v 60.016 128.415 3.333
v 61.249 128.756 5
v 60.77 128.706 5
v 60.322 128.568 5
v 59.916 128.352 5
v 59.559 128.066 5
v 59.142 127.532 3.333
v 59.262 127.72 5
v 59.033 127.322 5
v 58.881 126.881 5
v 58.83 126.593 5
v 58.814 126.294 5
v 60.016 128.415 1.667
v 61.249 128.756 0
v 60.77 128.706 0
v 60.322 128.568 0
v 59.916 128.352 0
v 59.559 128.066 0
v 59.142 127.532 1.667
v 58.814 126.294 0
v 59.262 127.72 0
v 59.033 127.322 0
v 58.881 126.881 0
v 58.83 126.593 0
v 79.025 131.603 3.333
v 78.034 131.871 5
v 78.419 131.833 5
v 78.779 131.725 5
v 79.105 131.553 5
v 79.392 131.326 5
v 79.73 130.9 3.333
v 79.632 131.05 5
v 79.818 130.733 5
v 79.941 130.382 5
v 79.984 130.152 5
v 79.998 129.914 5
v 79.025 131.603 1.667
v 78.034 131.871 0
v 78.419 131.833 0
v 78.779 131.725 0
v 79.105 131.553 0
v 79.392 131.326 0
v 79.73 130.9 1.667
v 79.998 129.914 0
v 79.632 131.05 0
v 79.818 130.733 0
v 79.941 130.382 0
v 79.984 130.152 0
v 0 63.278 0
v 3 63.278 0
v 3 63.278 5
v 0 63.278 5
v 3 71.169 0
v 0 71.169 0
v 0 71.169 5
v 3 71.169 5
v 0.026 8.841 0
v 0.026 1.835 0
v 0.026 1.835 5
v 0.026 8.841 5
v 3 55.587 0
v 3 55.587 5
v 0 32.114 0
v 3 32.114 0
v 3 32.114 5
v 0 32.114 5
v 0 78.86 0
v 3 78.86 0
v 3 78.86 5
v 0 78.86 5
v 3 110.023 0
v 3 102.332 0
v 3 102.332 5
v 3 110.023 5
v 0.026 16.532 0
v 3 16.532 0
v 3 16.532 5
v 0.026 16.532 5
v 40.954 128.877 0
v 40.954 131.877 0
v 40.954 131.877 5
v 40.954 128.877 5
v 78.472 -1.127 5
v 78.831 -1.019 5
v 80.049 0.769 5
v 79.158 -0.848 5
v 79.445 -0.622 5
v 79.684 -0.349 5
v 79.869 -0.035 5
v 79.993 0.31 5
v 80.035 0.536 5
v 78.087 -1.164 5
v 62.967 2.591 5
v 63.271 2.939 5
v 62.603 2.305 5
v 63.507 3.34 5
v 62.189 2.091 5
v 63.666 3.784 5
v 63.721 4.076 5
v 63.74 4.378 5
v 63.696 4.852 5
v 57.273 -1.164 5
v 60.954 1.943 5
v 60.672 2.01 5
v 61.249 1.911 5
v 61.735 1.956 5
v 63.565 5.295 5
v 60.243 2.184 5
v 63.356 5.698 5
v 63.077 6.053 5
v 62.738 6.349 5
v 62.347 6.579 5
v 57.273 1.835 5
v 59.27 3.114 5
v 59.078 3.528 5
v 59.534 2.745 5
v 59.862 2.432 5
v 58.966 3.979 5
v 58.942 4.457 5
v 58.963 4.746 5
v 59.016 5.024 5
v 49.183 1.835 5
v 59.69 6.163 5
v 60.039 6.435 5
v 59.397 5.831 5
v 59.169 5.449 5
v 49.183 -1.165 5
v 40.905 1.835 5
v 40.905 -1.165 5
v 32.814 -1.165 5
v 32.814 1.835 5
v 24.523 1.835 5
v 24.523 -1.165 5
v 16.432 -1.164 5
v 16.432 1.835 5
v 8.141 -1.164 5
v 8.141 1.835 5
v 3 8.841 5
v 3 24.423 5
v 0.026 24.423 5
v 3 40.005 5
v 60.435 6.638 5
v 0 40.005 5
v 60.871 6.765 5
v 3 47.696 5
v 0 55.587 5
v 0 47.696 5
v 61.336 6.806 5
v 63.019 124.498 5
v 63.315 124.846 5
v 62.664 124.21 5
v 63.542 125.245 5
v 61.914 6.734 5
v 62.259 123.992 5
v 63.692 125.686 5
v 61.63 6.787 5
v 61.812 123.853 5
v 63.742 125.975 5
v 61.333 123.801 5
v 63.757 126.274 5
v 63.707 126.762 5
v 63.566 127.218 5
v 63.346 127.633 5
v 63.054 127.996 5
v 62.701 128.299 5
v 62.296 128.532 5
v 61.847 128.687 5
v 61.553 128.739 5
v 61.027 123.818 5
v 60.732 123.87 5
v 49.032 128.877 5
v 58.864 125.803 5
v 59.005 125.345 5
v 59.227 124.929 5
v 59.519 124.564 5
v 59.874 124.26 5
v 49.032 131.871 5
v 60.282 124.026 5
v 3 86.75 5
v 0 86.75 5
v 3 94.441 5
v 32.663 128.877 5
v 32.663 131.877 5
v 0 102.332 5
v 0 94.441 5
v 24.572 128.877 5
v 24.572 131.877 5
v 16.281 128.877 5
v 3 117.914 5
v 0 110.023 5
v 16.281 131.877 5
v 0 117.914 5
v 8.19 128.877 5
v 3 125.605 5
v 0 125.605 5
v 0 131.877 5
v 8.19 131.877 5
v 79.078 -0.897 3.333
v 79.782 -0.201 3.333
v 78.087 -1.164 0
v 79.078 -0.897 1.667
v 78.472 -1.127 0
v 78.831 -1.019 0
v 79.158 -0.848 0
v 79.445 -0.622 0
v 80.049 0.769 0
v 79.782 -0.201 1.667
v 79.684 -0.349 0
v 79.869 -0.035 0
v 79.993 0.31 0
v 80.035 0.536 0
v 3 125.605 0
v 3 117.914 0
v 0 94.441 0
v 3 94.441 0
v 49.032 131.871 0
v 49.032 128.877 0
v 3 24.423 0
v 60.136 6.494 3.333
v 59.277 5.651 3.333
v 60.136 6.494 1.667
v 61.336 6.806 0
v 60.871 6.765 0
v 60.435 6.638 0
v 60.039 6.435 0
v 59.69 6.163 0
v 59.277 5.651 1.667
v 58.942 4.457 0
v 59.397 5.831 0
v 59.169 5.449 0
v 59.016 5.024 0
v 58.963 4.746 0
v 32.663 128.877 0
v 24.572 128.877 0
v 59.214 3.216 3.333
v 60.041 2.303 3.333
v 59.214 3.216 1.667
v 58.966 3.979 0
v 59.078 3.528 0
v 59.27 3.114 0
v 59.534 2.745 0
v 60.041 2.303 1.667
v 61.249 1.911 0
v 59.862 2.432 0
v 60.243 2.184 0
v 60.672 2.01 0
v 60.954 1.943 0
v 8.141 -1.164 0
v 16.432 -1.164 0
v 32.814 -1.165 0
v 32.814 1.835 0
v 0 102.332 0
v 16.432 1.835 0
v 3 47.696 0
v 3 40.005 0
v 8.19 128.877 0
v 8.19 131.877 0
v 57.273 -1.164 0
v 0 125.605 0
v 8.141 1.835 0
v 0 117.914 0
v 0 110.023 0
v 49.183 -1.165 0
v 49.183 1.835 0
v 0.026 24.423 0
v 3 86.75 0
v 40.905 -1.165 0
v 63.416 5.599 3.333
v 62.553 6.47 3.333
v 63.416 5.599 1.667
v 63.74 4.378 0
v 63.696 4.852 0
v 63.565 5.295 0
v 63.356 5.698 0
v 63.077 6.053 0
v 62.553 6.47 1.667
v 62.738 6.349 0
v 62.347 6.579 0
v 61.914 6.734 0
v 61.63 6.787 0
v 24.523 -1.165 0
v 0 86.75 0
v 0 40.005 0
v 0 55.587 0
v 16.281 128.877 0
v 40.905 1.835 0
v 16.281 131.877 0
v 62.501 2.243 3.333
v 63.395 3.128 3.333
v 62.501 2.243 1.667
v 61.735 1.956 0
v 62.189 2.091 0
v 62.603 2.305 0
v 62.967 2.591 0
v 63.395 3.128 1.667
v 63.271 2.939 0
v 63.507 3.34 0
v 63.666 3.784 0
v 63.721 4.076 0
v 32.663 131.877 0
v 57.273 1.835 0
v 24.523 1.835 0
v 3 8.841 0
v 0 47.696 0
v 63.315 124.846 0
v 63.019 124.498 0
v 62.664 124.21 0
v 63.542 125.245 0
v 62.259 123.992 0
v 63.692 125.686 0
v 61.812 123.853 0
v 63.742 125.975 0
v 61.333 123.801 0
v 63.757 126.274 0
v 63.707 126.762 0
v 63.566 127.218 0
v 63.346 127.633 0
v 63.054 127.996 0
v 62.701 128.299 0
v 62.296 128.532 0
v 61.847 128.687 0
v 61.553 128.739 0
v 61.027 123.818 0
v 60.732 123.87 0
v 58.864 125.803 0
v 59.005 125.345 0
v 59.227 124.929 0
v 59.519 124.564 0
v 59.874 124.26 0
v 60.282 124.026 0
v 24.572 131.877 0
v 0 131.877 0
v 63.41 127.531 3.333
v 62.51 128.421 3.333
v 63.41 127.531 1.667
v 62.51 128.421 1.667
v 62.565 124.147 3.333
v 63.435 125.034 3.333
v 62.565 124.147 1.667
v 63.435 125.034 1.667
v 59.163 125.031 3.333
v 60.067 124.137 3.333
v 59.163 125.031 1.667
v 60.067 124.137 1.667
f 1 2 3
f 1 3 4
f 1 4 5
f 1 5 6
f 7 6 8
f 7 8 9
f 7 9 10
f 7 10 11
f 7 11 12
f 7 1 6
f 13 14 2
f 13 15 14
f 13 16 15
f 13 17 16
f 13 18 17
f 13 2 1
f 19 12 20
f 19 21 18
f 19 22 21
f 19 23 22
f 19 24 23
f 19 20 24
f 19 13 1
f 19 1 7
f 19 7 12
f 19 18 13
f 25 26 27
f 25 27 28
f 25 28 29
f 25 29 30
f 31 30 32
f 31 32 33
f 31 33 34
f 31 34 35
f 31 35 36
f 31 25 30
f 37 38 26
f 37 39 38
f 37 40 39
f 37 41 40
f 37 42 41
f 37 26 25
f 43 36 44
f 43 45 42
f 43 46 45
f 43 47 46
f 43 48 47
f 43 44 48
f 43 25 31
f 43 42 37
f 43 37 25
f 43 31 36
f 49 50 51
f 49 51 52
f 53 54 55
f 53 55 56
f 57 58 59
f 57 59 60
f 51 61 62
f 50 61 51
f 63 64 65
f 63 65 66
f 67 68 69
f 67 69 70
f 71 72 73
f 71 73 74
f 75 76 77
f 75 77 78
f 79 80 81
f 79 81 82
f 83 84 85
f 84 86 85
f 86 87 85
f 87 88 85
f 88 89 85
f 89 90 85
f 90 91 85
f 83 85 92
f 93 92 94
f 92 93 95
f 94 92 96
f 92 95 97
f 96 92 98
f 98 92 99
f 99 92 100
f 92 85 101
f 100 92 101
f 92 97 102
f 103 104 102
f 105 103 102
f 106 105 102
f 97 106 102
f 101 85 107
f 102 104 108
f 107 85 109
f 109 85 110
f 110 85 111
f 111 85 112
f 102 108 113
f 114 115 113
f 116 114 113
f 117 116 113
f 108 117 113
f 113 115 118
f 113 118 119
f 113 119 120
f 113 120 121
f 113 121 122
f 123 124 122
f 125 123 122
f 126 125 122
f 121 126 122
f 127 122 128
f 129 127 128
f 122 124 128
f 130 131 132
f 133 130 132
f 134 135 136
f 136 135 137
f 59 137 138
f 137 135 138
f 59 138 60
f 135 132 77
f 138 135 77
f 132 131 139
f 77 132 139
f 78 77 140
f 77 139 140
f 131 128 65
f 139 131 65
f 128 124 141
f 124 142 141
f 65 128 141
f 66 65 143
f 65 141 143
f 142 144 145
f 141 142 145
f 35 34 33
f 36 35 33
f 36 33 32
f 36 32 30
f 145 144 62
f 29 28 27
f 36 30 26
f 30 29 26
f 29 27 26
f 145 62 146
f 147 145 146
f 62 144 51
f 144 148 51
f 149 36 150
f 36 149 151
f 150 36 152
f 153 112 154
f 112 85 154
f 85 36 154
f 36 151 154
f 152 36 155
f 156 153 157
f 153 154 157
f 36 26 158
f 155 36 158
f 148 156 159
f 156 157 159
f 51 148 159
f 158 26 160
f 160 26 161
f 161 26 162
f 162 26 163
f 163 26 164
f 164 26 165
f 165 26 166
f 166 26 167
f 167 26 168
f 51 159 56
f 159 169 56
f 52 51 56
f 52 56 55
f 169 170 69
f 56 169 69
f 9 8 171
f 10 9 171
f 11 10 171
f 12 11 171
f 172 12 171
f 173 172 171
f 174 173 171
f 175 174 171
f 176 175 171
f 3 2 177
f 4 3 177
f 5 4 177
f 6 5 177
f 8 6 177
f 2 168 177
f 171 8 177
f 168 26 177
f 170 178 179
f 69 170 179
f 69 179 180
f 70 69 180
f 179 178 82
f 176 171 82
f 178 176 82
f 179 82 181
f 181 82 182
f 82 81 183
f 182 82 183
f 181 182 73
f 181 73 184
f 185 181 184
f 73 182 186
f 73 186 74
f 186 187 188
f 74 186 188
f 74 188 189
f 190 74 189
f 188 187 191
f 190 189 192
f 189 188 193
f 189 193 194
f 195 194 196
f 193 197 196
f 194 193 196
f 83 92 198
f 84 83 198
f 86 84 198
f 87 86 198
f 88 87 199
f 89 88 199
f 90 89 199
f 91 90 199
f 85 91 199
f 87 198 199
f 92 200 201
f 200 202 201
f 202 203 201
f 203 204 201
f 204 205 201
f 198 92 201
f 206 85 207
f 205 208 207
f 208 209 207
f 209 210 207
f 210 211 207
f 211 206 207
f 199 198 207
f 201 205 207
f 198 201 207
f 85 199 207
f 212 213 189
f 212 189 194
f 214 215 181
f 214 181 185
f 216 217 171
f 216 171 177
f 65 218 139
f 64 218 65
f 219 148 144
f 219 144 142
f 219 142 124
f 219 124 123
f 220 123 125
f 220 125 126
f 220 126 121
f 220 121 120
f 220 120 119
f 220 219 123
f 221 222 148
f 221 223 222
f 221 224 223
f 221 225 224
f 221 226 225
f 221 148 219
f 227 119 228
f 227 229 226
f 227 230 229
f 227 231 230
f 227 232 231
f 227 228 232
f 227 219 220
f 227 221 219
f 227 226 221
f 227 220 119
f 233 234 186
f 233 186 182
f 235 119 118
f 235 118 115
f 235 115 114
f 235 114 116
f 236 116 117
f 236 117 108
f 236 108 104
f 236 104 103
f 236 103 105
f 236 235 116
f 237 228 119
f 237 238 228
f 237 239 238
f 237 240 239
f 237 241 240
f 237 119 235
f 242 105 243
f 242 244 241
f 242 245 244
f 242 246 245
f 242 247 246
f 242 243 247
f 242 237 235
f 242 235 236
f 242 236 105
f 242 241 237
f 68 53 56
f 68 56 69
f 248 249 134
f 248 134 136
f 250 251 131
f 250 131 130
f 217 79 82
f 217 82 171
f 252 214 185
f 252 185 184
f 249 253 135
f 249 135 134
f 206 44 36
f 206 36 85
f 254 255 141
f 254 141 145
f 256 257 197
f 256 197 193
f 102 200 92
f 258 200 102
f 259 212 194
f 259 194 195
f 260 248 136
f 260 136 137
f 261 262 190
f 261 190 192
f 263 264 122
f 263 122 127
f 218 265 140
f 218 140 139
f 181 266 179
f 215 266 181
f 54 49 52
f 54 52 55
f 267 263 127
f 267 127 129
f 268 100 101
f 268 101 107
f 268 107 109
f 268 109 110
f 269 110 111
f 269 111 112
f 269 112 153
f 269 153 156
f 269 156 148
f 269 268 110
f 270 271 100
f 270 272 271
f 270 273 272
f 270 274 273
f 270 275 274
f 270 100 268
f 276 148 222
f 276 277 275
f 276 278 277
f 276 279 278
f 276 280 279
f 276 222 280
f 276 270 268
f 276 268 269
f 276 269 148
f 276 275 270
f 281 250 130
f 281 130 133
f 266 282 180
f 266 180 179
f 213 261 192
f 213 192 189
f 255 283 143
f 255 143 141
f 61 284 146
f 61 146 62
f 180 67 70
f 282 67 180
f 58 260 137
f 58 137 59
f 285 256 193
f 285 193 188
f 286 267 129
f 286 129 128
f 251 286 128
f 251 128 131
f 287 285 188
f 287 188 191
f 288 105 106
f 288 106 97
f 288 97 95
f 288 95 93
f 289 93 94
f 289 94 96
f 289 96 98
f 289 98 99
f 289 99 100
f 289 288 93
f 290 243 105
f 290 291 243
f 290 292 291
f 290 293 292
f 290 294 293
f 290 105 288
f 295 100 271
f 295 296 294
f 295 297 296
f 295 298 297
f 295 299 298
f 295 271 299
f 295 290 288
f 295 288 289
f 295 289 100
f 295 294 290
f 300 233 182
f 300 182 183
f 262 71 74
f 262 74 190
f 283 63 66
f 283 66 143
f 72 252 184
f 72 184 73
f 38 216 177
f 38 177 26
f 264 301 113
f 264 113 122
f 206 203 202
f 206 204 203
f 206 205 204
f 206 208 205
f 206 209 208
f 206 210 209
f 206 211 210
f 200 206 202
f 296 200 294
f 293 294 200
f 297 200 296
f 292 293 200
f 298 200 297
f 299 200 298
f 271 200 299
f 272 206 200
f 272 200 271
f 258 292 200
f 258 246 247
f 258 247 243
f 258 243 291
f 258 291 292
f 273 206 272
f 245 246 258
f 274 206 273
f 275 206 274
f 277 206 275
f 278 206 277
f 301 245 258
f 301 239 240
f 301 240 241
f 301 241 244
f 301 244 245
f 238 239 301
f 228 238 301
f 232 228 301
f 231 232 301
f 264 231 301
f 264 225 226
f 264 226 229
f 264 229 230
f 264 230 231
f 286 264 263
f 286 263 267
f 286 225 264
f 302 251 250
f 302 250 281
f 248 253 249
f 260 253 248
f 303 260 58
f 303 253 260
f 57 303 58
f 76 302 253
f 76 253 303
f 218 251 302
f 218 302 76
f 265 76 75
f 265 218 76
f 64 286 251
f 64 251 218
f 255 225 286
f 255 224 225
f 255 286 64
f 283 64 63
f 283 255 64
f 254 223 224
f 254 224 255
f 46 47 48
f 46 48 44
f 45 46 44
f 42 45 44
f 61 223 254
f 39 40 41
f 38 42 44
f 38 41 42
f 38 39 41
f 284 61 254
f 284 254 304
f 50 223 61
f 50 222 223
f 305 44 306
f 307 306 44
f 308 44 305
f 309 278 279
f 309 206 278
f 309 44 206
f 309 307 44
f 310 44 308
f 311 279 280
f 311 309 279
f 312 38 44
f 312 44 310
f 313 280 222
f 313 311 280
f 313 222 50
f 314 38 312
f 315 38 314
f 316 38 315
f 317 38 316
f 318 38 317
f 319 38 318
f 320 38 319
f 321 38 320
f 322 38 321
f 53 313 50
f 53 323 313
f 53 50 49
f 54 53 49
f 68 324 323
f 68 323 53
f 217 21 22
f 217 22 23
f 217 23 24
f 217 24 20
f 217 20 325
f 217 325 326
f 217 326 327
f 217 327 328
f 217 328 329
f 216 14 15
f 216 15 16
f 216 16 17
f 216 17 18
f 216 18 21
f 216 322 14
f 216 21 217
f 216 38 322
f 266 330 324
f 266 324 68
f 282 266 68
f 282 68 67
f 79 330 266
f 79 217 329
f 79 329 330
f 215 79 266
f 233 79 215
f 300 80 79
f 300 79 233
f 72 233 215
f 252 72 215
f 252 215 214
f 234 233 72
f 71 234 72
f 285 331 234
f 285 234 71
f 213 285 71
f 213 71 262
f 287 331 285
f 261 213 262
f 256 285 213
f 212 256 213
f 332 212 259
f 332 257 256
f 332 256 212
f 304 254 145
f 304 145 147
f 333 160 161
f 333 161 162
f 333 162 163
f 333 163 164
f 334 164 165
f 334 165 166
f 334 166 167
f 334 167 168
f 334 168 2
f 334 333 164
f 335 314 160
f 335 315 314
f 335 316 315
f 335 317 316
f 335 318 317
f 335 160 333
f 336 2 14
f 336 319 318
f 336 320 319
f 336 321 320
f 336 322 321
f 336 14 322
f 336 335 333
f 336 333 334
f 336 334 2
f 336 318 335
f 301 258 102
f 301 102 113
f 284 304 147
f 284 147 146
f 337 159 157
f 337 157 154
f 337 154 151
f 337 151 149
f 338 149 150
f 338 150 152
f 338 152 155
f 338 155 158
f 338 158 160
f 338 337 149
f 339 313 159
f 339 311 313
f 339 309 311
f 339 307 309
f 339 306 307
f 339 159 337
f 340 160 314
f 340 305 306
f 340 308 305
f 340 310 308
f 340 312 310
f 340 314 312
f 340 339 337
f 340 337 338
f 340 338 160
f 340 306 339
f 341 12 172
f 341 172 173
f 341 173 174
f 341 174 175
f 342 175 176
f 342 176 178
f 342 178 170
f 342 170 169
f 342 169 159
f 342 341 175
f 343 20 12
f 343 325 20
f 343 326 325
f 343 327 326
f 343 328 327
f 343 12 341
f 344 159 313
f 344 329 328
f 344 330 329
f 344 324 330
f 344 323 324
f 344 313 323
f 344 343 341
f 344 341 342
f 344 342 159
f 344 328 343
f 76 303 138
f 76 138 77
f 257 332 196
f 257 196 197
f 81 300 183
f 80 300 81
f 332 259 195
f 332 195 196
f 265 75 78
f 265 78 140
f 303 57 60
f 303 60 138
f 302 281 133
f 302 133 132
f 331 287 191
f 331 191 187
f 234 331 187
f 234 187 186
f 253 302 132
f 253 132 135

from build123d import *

# Parameters (mm, degrees)
BOSS_EXTRUDE1_DEPTH = 5


with BuildPart() as part:
    # Sketch2 → Boss-Extrude1 (new body)
    with BuildSketch(Plane.XY):
        with BuildLine():
            Line((3.000022, 125.605083), (0, 125.605083))
            Line((0, 125.605083), (0, 131.876887))
            Line((0, 131.876887), (8.190395777, 131.876887))
            Line((8.190395777, 131.876887), (8.190395777, 128.876921))
            Line((8.190395777, 128.876921), (16.281283777, 128.876921))
            Line((16.281283777, 128.876921), (16.281283777, 131.876908))
            Line((16.281283777, 131.876908), (24.572181777, 131.876908))
            Line((24.572181777, 131.876908), (24.572181777, 128.876921))
            Line((24.572181777, 128.876921), (32.663126777, 128.876921))
            Line((32.663126777, 128.876921), (32.663126777, 131.876908))
            Line((32.663126777, 131.876908), (40.954024777, 131.876908))
            Line((40.954024777, 131.876908), (40.954024777, 128.876921))
            Line((40.954024777, 128.876921), (49.032014777, 128.876921))
            Line((49.032014777, 128.876921), (49.032014777, 131.870876))
            Line((49.032014777, 131.870876), (78.034171777, 131.870876))
            add(Edge.make_bspline(
                [(78.034171777, 131.870876), (79.118469777, 131.870876), (79.997507777, 130.991859), (79.998212777, 129.914053)],
                knots=[0, 0, 0, 0, 1, 1, 1, 1], degree=3))
            Line((79.998212777, 129.914053), (80.048932, 0.769332))
            add(Edge.make_bspline(
                [(78.08681, -1.164385), (79.171108, -1.164385), (80.050118, -0.285367), (80.048932, 0.769332)],
                knots=[0, 0, 0, 0, 1, 1, 1, 1], degree=3))
            Line((78.08681, -1.164385), (57.273444, -1.164385))
            Line((57.273444, -1.164385), (57.273444, 1.835025))
            Line((57.273444, 1.835025), (49.182528, 1.835025))
            Line((49.182528, 1.835025), (49.182528, -1.165))
            Line((49.182528, -1.165), (40.904555, -1.165))
            Line((40.904555, -1.165), (40.904555, 1.835025))
            Line((40.904555, 1.835025), (32.813639, 1.835025))
            Line((32.813639, 1.835025), (32.813639, -1.165))
            Line((32.813639, -1.165), (24.522769, -1.165))
            Line((24.522769, -1.165), (24.522769, 1.835025))
            Line((24.522769, 1.835025), (16.431825, 1.835025))
            Line((16.431825, 1.835025), (16.431825, -1.164385))
            Line((16.431825, -1.164385), (8.140926, -1.164385))
            Line((8.140926, -1.164385), (8.140926, 1.835025))
            Line((8.140926, 1.835025), (0.026314406, 1.835025))
            Line((0.026314406, 1.835025), (0.026314406, 8.841283))
            Line((0.026314406, 8.841283), (3.000022, 8.841283))
            Line((3.000022, 8.841283), (3.000022, 16.532191))
            Line((3.000022, 16.532191), (0.026314406, 16.532191))
            Line((0.026314406, 16.532191), (0.026314406, 24.423125))
            Line((0.026314406, 24.423125), (3.000022, 24.423125))
            Line((3.000022, 24.423125), (3.000022, 32.114033))
            Line((3.000022, 32.114033), (0, 32.114033))
            Line((0, 32.114033), (0, 40.004966))
            Line((0, 40.004966), (3.000022, 40.004966))
            Line((3.000022, 40.004966), (3.000022, 47.695875))
            Line((3.000022, 47.695875), (0, 47.695875))
            Line((0, 47.695875), (0, 55.586808))
            Line((0, 55.586808), (3.000022, 55.586808))
            Line((3.000022, 55.586808), (3.000022, 63.277716))
            Line((3.000022, 63.277716), (0, 63.277716))
            Line((0, 63.277716), (0, 71.16865))
            Line((0, 71.16865), (3.000022, 71.16865))
            Line((3.000022, 71.16865), (3.000022, 78.859558))
            Line((3.000022, 78.859558), (0, 78.859558))
            Line((0, 78.859558), (0, 86.750491))
            Line((0, 86.750491), (3.000022, 86.750491))
            Line((3.000022, 86.750491), (3.000022, 94.4414))
            Line((3.000022, 94.4414), (0, 94.4414))
            Line((0, 94.4414), (0, 102.332333))
            Line((0, 102.332333), (3.000022, 102.332333))
            Line((3.000022, 102.332333), (3.000022, 110.023241))
            Line((3.000022, 110.023241), (0, 110.023241))
            Line((0, 110.023241), (0, 117.914175))
            Line((0, 117.914175), (3.000022, 117.914175))
            Line((3.000022, 117.914175), (3.000022, 125.605083))
        make_face()
        with BuildLine():
            add(Edge.make_bspline(
                [(58.942475583, 4.45705786), (58.876355433, 3.116936717), (59.910031097, 1.976908278), (61.249001885, 1.910844885)],
                knots=[0, 0, 0, 0, 1, 1, 1, 1], degree=3))
            add(Edge.make_bspline(
                [(61.249001885, 1.910844885), (62.61708533, 1.904036469), (63.733535737, 3.008514398), (63.740350017, 4.377776229)],
                knots=[0, 0, 0, 0, 1, 1, 1, 1], degree=3))
            add(Edge.make_bspline(
                [(63.740350017, 4.377776229), (63.747057434, 5.712148161), (62.669459301, 6.79974011), (61.335720144, 6.806444347)],
                knots=[0, 0, 0, 0, 1, 1, 1, 1], degree=3))
            add(Edge.make_bspline(
                [(61.335720144, 6.806444347), (60.026995423, 6.818478401), (58.95451532, 5.766400599), (58.942475583, 4.45705786)],
                knots=[0, 0, 0, 0, 1, 1, 1, 1], degree=3))
        make_face(mode=Mode.SUBTRACT)
        with BuildLine():
            add(Edge.make_bspline(
                [(58.81372287, 126.294450328), (58.82088208, 124.91026836), (59.949710178, 123.793975081), (61.332703971, 123.801128146)],
                knots=[0, 0, 0, 0, 1, 1, 1, 1], degree=3))
            add(Edge.make_bspline(
                [(61.332703971, 123.801128146), (62.683823094, 123.814309965), (63.770278691, 124.921256436), (63.757085518, 126.273539334)],
                knots=[0, 0, 0, 0, 1, 1, 1, 1], degree=3))
            add(Edge.make_bspline(
                [(63.757085518, 126.273539334), (63.749960977, 127.651200571), (62.626009819, 128.762672593), (61.249001885, 128.755551431)],
                knots=[0, 0, 0, 0, 1, 1, 1, 1], degree=3))
            add(Edge.make_bspline(
                [(61.249001885, 128.755551431), (59.897851275, 128.748355096), (58.806523136, 127.646238991), (58.81372287, 126.294450328)],
                knots=[0, 0, 0, 0, 1, 1, 1, 1], degree=3))
        make_face(mode=Mode.SUBTRACT)
    extrude(amount=BOSS_EXTRUDE1_DEPTH)


solid = part.part
